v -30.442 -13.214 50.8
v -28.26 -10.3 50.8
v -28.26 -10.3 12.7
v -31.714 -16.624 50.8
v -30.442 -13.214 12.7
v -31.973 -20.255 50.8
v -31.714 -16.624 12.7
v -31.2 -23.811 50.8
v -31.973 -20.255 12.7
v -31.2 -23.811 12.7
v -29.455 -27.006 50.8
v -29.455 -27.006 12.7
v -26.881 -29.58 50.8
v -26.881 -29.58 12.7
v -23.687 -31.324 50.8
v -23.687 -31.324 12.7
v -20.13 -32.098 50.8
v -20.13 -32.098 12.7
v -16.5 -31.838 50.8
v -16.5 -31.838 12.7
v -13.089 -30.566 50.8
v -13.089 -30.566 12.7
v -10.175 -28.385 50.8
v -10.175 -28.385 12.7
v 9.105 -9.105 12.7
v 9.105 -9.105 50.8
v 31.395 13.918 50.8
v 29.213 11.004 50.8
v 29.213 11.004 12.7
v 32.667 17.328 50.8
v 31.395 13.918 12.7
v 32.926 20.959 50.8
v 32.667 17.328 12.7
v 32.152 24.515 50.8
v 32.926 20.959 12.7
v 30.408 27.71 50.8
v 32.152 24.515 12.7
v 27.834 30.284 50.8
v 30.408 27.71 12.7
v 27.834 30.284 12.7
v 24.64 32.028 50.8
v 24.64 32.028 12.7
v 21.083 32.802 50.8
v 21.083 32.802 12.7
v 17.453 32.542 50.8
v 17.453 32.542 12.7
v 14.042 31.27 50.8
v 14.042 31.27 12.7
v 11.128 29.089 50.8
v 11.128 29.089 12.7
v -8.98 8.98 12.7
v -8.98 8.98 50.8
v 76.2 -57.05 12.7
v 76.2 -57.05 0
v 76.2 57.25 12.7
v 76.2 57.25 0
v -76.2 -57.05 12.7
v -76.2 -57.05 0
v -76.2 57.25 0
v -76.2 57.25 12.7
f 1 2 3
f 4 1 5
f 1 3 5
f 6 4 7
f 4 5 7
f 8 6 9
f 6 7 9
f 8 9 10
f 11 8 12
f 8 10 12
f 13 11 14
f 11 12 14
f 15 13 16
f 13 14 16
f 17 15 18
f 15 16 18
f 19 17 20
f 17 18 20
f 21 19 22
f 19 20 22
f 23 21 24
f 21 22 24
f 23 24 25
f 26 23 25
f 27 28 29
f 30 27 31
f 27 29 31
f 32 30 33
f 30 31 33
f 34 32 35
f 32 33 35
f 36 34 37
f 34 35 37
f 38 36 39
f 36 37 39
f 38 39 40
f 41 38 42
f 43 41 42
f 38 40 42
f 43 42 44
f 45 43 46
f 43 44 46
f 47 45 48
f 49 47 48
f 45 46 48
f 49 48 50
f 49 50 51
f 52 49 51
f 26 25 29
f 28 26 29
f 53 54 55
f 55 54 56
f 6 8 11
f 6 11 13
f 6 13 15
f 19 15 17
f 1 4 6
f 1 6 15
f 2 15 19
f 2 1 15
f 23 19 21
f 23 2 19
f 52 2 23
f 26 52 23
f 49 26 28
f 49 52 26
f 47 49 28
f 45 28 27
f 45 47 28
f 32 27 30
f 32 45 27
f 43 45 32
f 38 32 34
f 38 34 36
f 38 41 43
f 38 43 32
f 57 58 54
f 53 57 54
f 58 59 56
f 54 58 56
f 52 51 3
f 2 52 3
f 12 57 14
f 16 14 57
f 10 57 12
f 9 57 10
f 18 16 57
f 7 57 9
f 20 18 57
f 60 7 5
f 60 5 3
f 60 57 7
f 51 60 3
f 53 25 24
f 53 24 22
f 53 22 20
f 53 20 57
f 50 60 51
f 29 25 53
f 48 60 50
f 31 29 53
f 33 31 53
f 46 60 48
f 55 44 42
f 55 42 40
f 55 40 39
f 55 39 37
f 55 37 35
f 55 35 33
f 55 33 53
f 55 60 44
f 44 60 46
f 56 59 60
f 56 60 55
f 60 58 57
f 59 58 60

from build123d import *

# Parameters (mm, degrees)
F0_W     = 152.4
F0_H     = 114.3
F1_DEPTH = 12.7
F2_DEPTH = 50.8


with BuildPart() as f1:
    # F0 (on Top) → F1 (new body)
    with BuildSketch(Plane.XY):
        with Locations((0, 0.099638)):
            Rectangle(F0_W, F0_H)
        with BuildLine():
            Line((-28.260375, -10.299862), (-8.980256, 8.980256))
            Line((-8.980256, 8.980256), (11.128381, 29.088893))
            ThreePointArc((11.128381, 29.088893), (29.213265, 29.088893), (29.213265, 11.004009))
            Line((29.213265, 11.004009), (9.104628, -9.104628))
            Line((9.104628, -9.104628), (-10.175491, -28.384746))
            ThreePointArc((-10.175491, -28.384746), (-28.260375, -28.384746), (-28.260375, -10.299862))
        make_face(mode=Mode.SUBTRACT)
        with BuildLine():
            Line((11.128381, 29.088893), (-8.980256, 8.980256))
            Line((-8.980256, 8.980256), (-28.260375, -10.299862))
            ThreePointArc((-28.260375, -10.299862), (-28.260375, -28.384746), (-10.175491, -28.384746))
            Line((-10.175491, -28.384746), (9.104628, -9.104628))
            Line((9.104628, -9.104628), (29.213265, 11.004009))
            ThreePointArc((29.213265, 11.004009), (29.213265, 29.088893), (11.128381, 29.088893))
        make_face()
    extrude(amount=F1_DEPTH)

    # F0 (on Top) → F2 (join)
    with BuildSketch(Plane.XY):
        with BuildLine():
            Line((11.128381, 29.088893), (-8.980256, 8.980256))
            Line((-8.980256, 8.980256), (-28.260375, -10.299862))
            ThreePointArc((-28.260375, -10.299862), (-28.260375, -28.384746), (-10.175491, -28.384746))
            Line((-10.175491, -28.384746), (9.104628, -9.104628))
            Line((9.104628, -9.104628), (29.213265, 11.004009))
            ThreePointArc((29.213265, 11.004009), (29.213265, 29.088893), (11.128381, 29.088893))
        make_face()
    extrude(amount=F2_DEPTH)


solid = f1.part
